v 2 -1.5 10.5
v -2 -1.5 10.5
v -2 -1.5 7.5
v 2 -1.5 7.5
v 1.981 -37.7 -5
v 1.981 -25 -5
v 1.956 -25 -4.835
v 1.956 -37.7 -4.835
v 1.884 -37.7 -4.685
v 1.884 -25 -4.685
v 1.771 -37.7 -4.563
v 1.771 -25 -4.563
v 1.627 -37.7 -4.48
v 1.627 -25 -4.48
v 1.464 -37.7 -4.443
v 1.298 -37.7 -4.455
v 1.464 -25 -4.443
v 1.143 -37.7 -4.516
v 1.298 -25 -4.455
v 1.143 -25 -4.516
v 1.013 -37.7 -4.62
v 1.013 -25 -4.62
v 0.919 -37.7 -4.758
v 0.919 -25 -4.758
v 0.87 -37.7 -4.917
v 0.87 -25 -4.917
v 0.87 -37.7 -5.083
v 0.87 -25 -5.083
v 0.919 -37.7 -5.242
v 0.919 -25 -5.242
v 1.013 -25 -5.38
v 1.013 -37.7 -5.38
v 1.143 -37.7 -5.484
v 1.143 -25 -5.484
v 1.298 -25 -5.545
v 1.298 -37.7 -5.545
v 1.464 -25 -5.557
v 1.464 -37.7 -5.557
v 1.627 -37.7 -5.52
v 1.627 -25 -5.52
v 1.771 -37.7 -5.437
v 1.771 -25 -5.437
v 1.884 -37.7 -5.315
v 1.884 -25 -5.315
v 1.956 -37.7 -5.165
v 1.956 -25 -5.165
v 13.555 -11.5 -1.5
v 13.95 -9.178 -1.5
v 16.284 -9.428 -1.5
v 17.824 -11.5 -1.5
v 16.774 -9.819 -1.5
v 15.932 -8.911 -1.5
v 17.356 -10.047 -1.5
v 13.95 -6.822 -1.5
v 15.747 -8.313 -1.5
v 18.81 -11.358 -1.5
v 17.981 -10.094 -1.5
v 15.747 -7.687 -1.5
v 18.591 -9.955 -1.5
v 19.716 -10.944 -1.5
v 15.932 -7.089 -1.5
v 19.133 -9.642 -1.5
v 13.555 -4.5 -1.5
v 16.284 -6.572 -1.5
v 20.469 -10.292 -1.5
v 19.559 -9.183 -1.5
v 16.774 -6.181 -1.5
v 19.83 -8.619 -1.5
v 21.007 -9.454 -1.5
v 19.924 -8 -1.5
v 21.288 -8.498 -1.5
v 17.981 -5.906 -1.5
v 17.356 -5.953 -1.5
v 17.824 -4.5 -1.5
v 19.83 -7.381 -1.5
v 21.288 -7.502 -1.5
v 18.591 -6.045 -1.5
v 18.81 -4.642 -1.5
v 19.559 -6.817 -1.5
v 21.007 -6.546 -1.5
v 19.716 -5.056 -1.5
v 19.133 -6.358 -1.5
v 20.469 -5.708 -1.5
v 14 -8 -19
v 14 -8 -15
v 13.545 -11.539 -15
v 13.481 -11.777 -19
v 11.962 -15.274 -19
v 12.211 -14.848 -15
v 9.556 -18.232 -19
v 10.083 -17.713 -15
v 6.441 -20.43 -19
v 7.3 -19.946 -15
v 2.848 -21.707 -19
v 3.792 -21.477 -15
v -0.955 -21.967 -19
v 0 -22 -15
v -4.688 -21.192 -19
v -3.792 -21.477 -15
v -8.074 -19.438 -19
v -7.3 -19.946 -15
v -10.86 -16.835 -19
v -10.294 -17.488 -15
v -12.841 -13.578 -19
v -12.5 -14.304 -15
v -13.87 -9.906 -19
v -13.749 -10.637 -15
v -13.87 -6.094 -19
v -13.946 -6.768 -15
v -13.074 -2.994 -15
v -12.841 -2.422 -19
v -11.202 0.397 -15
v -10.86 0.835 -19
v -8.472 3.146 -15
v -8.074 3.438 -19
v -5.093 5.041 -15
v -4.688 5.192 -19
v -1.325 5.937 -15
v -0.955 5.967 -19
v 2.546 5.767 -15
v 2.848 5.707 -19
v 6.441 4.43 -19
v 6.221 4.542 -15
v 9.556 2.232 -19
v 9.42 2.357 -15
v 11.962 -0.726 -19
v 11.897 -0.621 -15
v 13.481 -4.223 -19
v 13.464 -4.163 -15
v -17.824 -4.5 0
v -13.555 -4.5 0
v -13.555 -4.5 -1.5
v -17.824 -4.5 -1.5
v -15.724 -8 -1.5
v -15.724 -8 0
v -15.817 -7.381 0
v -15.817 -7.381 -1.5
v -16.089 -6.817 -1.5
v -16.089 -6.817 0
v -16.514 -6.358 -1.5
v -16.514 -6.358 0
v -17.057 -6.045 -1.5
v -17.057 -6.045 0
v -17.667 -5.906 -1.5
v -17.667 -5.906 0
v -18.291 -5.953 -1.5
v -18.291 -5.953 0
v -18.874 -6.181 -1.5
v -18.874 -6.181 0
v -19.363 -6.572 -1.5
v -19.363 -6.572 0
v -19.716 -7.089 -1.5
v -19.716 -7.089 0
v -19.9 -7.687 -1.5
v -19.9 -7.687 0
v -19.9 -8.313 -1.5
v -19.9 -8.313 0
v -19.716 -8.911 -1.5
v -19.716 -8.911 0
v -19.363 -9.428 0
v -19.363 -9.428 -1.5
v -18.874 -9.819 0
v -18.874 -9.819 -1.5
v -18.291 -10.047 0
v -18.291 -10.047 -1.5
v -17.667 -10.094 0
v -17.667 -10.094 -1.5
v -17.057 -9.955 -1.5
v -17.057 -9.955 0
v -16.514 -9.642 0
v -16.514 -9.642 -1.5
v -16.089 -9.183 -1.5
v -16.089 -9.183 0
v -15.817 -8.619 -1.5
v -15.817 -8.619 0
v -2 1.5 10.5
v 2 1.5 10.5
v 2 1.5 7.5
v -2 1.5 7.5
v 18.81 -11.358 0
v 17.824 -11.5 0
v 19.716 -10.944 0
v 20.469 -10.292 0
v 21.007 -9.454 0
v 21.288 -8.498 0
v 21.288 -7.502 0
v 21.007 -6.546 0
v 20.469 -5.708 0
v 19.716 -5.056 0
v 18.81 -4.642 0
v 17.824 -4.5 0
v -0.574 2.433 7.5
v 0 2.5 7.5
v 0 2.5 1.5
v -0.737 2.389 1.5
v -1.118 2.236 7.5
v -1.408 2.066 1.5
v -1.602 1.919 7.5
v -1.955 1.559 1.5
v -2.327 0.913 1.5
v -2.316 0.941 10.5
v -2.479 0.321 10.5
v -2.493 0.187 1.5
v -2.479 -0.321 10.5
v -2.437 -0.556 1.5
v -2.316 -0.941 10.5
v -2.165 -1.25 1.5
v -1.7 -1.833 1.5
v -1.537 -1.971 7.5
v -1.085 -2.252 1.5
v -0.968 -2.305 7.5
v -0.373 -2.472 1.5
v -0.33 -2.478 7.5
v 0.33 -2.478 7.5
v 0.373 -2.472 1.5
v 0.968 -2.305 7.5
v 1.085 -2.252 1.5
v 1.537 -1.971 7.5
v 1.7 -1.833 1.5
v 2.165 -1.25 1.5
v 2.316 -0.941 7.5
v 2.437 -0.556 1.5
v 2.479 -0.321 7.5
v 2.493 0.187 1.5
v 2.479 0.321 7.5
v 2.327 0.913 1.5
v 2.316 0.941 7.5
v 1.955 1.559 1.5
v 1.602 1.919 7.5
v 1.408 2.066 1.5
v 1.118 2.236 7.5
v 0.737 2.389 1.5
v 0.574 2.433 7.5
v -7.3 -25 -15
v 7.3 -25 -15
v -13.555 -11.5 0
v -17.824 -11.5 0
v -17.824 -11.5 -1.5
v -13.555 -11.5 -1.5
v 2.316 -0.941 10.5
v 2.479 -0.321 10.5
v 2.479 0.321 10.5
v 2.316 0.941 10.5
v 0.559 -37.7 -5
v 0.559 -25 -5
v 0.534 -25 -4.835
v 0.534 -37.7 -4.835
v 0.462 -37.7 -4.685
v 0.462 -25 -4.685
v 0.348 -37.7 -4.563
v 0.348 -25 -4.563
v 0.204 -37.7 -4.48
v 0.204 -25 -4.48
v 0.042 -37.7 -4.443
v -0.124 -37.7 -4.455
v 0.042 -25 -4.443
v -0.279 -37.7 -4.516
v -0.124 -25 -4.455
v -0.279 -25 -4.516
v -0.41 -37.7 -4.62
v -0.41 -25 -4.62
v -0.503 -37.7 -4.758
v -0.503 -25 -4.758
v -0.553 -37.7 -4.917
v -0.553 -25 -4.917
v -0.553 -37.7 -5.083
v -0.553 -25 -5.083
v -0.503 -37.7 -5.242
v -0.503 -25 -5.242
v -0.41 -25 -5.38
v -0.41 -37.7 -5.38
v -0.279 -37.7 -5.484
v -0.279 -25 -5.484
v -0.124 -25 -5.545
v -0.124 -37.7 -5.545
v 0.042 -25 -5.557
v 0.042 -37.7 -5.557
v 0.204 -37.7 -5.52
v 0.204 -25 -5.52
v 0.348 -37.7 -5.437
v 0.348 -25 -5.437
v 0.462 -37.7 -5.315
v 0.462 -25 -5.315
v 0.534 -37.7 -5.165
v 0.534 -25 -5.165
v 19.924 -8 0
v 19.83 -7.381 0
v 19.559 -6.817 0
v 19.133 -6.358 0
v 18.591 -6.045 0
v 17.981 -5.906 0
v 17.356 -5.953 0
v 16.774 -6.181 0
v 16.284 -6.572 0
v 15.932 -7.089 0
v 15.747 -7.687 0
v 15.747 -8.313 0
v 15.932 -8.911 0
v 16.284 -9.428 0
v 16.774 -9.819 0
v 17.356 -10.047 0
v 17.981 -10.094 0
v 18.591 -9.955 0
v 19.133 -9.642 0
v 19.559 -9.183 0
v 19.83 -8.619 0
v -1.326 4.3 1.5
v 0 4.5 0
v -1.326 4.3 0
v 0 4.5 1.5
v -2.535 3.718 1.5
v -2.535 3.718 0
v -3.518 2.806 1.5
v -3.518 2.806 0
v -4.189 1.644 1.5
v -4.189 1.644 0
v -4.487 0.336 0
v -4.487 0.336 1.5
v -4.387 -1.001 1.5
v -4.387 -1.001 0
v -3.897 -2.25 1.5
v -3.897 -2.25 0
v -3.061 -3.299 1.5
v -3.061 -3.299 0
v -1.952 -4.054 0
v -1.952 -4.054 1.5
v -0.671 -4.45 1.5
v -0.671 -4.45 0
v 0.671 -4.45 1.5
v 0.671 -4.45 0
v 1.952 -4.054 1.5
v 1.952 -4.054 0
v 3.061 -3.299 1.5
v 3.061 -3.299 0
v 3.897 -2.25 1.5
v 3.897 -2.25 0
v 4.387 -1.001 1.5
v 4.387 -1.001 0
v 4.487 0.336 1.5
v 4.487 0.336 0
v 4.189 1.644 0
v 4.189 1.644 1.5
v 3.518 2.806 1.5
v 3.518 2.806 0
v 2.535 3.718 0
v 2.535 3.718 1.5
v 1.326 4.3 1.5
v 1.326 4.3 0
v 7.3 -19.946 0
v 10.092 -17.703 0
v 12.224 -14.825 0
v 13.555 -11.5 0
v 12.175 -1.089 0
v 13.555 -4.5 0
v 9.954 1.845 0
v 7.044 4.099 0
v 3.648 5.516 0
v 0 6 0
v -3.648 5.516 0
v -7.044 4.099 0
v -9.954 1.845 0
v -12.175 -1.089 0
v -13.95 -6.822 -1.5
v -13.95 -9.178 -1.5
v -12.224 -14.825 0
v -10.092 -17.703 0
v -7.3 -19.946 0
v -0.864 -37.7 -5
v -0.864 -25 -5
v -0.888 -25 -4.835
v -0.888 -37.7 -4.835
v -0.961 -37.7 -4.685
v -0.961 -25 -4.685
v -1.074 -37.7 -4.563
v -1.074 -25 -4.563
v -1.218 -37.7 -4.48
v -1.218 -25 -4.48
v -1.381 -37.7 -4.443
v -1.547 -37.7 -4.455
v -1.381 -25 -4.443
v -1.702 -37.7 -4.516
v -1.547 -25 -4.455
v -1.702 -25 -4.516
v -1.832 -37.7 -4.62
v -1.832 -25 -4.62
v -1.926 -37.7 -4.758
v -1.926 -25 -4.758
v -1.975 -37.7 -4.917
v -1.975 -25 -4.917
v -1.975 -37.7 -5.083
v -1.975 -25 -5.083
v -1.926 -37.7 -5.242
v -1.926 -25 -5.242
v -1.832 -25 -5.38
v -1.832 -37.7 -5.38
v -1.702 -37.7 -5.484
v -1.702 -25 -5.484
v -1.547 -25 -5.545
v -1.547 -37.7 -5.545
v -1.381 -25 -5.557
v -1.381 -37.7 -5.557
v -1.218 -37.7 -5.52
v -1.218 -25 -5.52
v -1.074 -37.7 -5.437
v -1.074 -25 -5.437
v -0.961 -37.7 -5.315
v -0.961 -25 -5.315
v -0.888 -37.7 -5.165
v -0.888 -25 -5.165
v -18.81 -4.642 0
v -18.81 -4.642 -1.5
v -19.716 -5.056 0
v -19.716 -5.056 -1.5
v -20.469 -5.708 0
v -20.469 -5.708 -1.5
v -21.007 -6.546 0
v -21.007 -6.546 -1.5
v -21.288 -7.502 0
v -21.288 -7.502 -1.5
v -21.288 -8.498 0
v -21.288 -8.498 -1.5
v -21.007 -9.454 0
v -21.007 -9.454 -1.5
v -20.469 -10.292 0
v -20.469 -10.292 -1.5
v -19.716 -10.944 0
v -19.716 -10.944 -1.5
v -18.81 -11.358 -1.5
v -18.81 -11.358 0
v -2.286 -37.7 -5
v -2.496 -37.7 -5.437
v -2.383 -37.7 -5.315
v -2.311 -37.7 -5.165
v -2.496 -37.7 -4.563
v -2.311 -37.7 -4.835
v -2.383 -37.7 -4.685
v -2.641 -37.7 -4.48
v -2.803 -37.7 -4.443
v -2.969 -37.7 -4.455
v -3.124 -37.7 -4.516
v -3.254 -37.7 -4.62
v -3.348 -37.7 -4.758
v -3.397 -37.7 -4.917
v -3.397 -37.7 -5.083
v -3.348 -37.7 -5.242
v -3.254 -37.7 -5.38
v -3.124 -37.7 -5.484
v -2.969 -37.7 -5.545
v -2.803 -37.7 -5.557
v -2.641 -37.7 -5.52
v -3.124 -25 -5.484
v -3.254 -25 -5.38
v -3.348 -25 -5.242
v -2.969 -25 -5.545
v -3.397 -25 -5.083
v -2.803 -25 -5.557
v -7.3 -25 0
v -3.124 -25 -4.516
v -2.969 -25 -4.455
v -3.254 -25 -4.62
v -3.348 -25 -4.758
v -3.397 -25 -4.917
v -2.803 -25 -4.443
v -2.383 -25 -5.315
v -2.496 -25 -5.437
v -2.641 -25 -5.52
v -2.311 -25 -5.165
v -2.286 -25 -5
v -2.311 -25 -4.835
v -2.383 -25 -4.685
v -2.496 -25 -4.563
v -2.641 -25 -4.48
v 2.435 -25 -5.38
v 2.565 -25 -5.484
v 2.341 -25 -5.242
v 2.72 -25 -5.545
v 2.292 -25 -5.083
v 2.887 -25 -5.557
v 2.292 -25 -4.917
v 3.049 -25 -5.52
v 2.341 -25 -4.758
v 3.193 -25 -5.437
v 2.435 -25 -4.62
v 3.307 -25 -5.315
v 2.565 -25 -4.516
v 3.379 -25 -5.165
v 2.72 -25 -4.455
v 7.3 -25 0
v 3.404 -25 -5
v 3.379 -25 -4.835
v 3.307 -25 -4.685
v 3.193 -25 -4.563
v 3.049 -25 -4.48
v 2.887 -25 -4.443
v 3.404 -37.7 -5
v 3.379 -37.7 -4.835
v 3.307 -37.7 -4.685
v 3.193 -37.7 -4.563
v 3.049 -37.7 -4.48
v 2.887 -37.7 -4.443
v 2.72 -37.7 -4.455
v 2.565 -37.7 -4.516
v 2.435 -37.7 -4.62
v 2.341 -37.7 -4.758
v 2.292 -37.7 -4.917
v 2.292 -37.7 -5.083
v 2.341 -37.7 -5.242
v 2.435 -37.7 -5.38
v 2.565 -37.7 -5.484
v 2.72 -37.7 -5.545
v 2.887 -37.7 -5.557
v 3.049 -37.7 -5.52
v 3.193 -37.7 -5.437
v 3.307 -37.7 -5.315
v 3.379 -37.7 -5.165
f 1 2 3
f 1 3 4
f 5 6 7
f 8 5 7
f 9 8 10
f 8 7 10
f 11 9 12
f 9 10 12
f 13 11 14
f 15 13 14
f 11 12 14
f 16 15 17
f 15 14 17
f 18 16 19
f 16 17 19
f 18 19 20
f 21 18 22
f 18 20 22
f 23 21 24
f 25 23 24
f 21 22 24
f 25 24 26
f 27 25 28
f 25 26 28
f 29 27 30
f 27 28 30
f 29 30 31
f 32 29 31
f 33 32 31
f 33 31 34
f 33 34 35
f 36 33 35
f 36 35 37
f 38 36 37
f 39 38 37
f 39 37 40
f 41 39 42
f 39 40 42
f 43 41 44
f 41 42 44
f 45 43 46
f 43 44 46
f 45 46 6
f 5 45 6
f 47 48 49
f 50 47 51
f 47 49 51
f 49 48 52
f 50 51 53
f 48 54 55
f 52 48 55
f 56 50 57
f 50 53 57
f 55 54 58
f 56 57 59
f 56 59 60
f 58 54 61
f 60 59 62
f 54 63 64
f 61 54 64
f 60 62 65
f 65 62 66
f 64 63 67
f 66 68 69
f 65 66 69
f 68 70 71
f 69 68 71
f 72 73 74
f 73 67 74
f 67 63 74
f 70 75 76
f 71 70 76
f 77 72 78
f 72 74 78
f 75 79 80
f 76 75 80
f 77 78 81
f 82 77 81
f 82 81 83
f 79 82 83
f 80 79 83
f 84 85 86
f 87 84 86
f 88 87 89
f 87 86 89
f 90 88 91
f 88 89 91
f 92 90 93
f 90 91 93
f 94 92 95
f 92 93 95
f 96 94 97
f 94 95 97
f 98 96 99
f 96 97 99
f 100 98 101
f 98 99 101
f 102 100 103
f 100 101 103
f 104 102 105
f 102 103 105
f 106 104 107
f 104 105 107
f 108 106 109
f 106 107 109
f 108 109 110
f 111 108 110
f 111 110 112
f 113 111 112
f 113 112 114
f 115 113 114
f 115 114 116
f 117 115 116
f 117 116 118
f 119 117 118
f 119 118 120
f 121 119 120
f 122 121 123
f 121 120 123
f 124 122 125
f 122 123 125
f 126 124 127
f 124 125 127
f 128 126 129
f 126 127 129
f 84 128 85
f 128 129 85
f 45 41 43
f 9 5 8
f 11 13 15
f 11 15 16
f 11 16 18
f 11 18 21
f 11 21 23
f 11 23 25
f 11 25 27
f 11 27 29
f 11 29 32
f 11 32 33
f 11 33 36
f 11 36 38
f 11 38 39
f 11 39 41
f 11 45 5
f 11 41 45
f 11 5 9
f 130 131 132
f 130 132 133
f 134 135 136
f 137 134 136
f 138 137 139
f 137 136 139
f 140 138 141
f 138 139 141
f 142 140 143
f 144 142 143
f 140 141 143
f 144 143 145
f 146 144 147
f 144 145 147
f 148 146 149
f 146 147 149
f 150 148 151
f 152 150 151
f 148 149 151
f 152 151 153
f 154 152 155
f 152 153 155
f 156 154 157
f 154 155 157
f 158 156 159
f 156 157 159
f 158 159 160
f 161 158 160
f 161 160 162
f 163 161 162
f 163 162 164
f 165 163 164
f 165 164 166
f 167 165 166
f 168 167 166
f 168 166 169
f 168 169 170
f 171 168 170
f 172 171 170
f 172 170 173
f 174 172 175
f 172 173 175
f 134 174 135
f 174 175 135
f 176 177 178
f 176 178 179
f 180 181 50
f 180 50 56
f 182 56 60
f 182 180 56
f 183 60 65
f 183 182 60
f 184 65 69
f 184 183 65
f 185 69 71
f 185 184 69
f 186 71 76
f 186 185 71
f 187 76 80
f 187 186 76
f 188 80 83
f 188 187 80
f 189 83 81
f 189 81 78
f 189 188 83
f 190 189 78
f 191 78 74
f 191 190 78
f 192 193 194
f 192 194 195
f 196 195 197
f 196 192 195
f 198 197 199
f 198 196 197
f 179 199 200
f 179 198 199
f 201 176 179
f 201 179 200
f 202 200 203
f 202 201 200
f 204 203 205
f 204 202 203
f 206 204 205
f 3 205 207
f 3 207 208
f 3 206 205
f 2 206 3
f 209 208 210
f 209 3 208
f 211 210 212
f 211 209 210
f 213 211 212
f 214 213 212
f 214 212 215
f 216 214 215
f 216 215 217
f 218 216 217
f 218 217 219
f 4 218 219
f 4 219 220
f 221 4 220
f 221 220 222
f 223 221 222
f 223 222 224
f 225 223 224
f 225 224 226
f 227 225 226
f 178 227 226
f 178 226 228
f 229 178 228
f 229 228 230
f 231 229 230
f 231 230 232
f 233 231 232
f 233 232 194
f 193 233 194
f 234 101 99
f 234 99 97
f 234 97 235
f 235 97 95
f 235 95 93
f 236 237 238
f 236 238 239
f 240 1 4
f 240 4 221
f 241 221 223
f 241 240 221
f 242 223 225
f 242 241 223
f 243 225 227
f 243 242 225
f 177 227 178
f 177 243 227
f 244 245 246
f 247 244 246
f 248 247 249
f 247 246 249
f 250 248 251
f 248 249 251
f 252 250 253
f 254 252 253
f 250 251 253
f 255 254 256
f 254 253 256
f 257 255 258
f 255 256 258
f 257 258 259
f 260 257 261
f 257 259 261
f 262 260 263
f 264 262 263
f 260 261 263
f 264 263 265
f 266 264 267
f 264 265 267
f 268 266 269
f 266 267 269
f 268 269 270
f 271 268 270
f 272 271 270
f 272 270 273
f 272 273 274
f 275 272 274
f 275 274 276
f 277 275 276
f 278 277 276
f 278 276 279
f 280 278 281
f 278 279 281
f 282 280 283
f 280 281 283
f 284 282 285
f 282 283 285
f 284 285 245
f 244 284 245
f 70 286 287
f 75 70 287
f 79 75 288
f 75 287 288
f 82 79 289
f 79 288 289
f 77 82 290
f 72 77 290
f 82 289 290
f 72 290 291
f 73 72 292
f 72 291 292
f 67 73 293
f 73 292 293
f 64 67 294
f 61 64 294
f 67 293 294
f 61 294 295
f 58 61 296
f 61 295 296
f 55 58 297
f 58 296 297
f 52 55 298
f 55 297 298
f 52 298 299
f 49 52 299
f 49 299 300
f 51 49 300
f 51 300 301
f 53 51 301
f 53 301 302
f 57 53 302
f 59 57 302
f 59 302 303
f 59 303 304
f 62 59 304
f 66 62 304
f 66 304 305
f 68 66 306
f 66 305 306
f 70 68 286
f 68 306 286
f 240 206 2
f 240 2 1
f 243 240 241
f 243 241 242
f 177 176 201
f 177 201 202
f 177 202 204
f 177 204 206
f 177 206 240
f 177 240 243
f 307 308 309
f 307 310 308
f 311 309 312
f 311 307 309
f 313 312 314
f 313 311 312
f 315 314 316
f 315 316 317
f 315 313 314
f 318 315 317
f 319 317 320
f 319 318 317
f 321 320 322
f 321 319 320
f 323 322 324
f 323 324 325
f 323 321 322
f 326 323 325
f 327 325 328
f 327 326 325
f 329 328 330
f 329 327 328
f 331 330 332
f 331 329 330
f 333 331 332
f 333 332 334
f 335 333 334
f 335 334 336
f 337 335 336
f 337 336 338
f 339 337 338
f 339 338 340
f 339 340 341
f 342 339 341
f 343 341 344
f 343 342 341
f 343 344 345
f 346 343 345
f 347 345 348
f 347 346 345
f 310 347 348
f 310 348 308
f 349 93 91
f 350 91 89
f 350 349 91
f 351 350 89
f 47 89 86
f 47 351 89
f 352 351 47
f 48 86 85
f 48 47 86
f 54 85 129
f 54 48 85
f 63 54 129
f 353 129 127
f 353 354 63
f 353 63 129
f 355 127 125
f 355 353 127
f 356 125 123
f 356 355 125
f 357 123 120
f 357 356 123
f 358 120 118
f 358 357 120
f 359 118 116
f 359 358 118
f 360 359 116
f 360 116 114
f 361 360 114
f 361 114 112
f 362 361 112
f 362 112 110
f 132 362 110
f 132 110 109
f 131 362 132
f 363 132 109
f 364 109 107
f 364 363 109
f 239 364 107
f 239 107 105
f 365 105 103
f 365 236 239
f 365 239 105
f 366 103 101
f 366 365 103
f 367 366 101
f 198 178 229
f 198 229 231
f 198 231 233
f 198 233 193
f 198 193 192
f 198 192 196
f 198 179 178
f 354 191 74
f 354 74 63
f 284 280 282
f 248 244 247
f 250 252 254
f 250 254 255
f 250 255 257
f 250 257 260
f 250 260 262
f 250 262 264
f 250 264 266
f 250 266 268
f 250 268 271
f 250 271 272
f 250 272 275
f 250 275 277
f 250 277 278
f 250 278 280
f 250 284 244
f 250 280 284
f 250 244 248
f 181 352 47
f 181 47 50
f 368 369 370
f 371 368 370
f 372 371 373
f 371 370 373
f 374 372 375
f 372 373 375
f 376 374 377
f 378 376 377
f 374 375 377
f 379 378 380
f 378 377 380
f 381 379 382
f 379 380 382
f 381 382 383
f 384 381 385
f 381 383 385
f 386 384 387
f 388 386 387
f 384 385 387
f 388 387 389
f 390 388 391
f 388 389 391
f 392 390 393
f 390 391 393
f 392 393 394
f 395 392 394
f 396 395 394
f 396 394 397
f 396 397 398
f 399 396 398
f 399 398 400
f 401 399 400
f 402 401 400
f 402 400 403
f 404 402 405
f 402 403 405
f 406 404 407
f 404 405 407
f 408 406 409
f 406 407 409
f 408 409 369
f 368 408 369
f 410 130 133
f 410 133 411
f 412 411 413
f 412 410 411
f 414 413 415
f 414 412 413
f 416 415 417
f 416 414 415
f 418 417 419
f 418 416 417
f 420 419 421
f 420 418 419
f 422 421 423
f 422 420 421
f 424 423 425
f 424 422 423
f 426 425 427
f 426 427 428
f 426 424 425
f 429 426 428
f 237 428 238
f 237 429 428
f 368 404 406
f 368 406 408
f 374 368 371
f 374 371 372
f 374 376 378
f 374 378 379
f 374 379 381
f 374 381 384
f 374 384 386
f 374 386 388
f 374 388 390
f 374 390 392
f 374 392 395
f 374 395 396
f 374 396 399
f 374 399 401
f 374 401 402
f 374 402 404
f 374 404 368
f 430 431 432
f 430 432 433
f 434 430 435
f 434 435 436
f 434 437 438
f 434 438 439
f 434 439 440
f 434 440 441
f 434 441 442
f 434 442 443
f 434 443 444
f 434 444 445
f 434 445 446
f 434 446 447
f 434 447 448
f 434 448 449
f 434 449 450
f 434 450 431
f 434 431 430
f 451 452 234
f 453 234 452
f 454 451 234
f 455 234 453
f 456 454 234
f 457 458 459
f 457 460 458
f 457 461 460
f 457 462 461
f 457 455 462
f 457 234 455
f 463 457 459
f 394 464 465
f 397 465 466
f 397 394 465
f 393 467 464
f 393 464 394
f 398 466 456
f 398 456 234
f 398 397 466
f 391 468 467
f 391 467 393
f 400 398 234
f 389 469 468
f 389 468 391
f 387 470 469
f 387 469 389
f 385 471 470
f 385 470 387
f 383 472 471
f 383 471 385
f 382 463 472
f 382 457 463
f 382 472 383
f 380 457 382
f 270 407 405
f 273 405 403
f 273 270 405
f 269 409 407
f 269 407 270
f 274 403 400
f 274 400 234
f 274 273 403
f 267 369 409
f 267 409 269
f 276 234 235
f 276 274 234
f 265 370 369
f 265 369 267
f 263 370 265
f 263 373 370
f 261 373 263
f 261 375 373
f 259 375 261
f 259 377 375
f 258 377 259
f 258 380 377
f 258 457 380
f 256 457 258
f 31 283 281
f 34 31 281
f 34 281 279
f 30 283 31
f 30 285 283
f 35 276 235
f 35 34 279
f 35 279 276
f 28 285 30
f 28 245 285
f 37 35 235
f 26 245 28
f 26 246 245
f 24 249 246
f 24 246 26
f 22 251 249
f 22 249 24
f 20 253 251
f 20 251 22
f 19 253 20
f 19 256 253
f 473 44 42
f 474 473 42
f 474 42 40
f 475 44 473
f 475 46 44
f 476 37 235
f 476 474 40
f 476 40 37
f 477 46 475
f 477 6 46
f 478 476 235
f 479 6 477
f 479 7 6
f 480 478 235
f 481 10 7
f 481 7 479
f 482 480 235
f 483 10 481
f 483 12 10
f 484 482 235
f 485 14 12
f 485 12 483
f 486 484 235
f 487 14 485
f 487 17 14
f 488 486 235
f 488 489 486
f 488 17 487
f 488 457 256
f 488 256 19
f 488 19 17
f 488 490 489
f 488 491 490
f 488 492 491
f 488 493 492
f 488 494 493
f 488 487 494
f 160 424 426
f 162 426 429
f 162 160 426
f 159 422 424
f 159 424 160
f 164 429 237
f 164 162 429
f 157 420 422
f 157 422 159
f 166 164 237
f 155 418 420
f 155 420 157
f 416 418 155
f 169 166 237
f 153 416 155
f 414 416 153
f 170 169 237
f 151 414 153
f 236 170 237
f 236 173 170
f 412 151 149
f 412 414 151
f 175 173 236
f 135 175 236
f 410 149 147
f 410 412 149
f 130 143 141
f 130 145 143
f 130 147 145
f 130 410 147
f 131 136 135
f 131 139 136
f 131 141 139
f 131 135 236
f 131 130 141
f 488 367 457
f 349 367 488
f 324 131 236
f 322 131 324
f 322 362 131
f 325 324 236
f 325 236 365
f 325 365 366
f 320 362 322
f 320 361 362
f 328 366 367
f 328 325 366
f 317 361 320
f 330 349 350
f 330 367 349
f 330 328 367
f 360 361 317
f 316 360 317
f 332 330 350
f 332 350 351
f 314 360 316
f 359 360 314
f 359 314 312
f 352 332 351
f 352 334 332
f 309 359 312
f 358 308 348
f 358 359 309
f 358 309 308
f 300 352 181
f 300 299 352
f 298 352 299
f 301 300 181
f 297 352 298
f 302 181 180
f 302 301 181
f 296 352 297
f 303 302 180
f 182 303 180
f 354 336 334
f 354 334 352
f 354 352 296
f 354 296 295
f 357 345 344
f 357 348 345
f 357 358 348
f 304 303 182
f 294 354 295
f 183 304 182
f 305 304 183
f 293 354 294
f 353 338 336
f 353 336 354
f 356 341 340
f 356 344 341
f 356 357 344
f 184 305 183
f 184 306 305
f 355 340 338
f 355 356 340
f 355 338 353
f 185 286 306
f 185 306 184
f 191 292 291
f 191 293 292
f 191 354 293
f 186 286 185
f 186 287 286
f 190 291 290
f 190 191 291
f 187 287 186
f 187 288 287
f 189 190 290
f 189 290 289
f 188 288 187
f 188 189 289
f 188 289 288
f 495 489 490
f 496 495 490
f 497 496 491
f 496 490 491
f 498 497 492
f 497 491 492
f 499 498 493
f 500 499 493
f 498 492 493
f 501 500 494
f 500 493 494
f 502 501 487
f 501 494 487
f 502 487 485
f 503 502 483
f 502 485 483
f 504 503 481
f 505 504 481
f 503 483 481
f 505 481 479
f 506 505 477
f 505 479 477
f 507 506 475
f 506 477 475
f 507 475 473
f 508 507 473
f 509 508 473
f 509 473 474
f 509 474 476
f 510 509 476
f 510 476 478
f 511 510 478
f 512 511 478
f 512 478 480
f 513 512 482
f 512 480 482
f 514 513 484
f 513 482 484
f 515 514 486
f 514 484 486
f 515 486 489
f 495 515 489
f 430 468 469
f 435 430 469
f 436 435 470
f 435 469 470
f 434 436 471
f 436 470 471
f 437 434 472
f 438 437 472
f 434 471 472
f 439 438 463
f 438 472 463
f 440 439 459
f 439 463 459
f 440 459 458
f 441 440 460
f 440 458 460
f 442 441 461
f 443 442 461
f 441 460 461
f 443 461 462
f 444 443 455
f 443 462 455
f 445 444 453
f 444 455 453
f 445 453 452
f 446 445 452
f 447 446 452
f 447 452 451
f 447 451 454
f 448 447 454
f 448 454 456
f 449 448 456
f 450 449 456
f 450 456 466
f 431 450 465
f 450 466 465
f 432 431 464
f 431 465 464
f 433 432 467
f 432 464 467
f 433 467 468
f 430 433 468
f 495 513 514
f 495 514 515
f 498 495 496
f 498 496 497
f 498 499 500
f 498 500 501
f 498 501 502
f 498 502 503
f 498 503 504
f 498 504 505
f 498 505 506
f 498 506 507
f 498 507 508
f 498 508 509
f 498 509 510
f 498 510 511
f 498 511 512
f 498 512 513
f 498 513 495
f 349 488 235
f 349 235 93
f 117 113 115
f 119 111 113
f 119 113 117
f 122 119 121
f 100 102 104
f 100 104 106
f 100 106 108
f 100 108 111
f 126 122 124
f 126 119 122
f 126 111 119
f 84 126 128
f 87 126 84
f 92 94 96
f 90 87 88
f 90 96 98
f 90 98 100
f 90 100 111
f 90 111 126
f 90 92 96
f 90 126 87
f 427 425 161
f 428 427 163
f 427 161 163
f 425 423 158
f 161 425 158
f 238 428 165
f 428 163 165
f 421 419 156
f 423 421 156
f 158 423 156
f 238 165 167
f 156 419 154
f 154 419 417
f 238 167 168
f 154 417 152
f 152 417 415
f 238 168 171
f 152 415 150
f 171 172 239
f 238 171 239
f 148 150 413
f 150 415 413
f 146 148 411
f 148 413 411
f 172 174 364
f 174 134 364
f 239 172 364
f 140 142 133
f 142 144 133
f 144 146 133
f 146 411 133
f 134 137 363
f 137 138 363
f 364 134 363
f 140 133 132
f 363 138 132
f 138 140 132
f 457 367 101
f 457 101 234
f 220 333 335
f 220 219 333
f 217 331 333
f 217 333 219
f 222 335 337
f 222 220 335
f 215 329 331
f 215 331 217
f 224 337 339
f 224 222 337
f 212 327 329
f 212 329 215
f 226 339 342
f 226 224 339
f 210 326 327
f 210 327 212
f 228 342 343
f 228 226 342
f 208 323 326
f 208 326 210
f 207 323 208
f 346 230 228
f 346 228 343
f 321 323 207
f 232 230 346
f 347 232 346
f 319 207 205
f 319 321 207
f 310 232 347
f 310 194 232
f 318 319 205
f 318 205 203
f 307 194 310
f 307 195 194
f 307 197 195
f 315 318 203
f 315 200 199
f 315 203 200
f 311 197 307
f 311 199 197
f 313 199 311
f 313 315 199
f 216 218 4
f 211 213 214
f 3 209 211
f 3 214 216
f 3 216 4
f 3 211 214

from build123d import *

# Parameters (mm, degrees)
F1_DEPTH  = 15
F2_R      = 14
F3_DEPTH  = 4
F4_R      = 2.1
F5_DEPTH  = 1.5
F7_R      = 0.5588
F8_DEPTH  = 12.7
F13_DEPTH = 3


with BuildPart() as f1:
    # F0 (on Top) → F1 (new body)
    with BuildSketch(Plane.XY):
        with BuildLine():
            Line((7.3, -25), (7.3, -19.946129))
            ThreePointArc((7.3, -19.946129), (0, 6), (-7.3, -19.946129))
            Line((-7.3, -19.946129), (-7.3, -25))
            Line((-7.3, -25), (7.3, -25))
        make_face()
    extrude(amount=-F1_DEPTH)

    # F2 (on face) → F3 (join)
    with BuildSketch(Plane(origin=(0, 0, -15), x_dir=(1, 0, 0), z_dir=(0, 0, -1))):
        with Locations((0, 8)):
            Circle(F2_R)
    extrude(amount=F3_DEPTH)

    # F4 (on Top) → F5 (join)
    with BuildSketch(Plane.XY):
        with BuildLine():
            ThreePointArc((-17.823718, -4.5), (-21.323718, -8), (-17.823718, -11.5))
            Line((-17.823718, -11.5), (17.823718, -11.5))
            ThreePointArc((17.823718, -11.5), (21.323718, -8), (17.823718, -4.5))
            Line((17.823718, -4.5), (-17.823718, -4.5))
        make_face()
        with Locations((-17.823718, -8)):
            Circle(F4_R, mode=Mode.SUBTRACT)
        with Locations((17.823718, -8)):
            Circle(F4_R, mode=Mode.SUBTRACT)
    extrude(amount=-F5_DEPTH)

    # F7 (on face) → F8 (join)
    with BuildSketch(Plane.XZ.offset(25)):
        with Locations((-2.8448, -5)):
            Circle(F7_R)
        with Locations((-1.4224, -5)):
            Circle(F7_R)
        with Locations((0, -5)):
            Circle(F7_R)
        with Locations((1.4224, -5)):
            Circle(F7_R)
        with Locations((2.8448, -5)):
            Circle(F7_R)
    extrude(amount=F8_DEPTH)

    # F9 (on Right) → F10 (revolve)
    with BuildSketch(Plane.YZ):
        Polygon((0, 7.5), (0, 0), (4.5, 0), (4.5, 1.5), (2.5, 1.5), (2.5, 7.5), align=None)
    revolve(axis=Axis((0, 0, 3.75), (0, 0, 1)))

    # F12 (on offset) → F13 (join, through all)
    with BuildSketch(Plane.XY.offset(10.5)):
        with BuildLine():
            Line((2, 1.5), (-2, 1.5))
            ThreePointArc((-2, 1.5), (-2.5, 0), (-2, -1.5))
            Line((-2, -1.5), (2, -1.5))
            ThreePointArc((2, -1.5), (2.5, 0), (2, 1.5))
        make_face()
    extrude(amount=-F13_DEPTH)


solid = f1.part
